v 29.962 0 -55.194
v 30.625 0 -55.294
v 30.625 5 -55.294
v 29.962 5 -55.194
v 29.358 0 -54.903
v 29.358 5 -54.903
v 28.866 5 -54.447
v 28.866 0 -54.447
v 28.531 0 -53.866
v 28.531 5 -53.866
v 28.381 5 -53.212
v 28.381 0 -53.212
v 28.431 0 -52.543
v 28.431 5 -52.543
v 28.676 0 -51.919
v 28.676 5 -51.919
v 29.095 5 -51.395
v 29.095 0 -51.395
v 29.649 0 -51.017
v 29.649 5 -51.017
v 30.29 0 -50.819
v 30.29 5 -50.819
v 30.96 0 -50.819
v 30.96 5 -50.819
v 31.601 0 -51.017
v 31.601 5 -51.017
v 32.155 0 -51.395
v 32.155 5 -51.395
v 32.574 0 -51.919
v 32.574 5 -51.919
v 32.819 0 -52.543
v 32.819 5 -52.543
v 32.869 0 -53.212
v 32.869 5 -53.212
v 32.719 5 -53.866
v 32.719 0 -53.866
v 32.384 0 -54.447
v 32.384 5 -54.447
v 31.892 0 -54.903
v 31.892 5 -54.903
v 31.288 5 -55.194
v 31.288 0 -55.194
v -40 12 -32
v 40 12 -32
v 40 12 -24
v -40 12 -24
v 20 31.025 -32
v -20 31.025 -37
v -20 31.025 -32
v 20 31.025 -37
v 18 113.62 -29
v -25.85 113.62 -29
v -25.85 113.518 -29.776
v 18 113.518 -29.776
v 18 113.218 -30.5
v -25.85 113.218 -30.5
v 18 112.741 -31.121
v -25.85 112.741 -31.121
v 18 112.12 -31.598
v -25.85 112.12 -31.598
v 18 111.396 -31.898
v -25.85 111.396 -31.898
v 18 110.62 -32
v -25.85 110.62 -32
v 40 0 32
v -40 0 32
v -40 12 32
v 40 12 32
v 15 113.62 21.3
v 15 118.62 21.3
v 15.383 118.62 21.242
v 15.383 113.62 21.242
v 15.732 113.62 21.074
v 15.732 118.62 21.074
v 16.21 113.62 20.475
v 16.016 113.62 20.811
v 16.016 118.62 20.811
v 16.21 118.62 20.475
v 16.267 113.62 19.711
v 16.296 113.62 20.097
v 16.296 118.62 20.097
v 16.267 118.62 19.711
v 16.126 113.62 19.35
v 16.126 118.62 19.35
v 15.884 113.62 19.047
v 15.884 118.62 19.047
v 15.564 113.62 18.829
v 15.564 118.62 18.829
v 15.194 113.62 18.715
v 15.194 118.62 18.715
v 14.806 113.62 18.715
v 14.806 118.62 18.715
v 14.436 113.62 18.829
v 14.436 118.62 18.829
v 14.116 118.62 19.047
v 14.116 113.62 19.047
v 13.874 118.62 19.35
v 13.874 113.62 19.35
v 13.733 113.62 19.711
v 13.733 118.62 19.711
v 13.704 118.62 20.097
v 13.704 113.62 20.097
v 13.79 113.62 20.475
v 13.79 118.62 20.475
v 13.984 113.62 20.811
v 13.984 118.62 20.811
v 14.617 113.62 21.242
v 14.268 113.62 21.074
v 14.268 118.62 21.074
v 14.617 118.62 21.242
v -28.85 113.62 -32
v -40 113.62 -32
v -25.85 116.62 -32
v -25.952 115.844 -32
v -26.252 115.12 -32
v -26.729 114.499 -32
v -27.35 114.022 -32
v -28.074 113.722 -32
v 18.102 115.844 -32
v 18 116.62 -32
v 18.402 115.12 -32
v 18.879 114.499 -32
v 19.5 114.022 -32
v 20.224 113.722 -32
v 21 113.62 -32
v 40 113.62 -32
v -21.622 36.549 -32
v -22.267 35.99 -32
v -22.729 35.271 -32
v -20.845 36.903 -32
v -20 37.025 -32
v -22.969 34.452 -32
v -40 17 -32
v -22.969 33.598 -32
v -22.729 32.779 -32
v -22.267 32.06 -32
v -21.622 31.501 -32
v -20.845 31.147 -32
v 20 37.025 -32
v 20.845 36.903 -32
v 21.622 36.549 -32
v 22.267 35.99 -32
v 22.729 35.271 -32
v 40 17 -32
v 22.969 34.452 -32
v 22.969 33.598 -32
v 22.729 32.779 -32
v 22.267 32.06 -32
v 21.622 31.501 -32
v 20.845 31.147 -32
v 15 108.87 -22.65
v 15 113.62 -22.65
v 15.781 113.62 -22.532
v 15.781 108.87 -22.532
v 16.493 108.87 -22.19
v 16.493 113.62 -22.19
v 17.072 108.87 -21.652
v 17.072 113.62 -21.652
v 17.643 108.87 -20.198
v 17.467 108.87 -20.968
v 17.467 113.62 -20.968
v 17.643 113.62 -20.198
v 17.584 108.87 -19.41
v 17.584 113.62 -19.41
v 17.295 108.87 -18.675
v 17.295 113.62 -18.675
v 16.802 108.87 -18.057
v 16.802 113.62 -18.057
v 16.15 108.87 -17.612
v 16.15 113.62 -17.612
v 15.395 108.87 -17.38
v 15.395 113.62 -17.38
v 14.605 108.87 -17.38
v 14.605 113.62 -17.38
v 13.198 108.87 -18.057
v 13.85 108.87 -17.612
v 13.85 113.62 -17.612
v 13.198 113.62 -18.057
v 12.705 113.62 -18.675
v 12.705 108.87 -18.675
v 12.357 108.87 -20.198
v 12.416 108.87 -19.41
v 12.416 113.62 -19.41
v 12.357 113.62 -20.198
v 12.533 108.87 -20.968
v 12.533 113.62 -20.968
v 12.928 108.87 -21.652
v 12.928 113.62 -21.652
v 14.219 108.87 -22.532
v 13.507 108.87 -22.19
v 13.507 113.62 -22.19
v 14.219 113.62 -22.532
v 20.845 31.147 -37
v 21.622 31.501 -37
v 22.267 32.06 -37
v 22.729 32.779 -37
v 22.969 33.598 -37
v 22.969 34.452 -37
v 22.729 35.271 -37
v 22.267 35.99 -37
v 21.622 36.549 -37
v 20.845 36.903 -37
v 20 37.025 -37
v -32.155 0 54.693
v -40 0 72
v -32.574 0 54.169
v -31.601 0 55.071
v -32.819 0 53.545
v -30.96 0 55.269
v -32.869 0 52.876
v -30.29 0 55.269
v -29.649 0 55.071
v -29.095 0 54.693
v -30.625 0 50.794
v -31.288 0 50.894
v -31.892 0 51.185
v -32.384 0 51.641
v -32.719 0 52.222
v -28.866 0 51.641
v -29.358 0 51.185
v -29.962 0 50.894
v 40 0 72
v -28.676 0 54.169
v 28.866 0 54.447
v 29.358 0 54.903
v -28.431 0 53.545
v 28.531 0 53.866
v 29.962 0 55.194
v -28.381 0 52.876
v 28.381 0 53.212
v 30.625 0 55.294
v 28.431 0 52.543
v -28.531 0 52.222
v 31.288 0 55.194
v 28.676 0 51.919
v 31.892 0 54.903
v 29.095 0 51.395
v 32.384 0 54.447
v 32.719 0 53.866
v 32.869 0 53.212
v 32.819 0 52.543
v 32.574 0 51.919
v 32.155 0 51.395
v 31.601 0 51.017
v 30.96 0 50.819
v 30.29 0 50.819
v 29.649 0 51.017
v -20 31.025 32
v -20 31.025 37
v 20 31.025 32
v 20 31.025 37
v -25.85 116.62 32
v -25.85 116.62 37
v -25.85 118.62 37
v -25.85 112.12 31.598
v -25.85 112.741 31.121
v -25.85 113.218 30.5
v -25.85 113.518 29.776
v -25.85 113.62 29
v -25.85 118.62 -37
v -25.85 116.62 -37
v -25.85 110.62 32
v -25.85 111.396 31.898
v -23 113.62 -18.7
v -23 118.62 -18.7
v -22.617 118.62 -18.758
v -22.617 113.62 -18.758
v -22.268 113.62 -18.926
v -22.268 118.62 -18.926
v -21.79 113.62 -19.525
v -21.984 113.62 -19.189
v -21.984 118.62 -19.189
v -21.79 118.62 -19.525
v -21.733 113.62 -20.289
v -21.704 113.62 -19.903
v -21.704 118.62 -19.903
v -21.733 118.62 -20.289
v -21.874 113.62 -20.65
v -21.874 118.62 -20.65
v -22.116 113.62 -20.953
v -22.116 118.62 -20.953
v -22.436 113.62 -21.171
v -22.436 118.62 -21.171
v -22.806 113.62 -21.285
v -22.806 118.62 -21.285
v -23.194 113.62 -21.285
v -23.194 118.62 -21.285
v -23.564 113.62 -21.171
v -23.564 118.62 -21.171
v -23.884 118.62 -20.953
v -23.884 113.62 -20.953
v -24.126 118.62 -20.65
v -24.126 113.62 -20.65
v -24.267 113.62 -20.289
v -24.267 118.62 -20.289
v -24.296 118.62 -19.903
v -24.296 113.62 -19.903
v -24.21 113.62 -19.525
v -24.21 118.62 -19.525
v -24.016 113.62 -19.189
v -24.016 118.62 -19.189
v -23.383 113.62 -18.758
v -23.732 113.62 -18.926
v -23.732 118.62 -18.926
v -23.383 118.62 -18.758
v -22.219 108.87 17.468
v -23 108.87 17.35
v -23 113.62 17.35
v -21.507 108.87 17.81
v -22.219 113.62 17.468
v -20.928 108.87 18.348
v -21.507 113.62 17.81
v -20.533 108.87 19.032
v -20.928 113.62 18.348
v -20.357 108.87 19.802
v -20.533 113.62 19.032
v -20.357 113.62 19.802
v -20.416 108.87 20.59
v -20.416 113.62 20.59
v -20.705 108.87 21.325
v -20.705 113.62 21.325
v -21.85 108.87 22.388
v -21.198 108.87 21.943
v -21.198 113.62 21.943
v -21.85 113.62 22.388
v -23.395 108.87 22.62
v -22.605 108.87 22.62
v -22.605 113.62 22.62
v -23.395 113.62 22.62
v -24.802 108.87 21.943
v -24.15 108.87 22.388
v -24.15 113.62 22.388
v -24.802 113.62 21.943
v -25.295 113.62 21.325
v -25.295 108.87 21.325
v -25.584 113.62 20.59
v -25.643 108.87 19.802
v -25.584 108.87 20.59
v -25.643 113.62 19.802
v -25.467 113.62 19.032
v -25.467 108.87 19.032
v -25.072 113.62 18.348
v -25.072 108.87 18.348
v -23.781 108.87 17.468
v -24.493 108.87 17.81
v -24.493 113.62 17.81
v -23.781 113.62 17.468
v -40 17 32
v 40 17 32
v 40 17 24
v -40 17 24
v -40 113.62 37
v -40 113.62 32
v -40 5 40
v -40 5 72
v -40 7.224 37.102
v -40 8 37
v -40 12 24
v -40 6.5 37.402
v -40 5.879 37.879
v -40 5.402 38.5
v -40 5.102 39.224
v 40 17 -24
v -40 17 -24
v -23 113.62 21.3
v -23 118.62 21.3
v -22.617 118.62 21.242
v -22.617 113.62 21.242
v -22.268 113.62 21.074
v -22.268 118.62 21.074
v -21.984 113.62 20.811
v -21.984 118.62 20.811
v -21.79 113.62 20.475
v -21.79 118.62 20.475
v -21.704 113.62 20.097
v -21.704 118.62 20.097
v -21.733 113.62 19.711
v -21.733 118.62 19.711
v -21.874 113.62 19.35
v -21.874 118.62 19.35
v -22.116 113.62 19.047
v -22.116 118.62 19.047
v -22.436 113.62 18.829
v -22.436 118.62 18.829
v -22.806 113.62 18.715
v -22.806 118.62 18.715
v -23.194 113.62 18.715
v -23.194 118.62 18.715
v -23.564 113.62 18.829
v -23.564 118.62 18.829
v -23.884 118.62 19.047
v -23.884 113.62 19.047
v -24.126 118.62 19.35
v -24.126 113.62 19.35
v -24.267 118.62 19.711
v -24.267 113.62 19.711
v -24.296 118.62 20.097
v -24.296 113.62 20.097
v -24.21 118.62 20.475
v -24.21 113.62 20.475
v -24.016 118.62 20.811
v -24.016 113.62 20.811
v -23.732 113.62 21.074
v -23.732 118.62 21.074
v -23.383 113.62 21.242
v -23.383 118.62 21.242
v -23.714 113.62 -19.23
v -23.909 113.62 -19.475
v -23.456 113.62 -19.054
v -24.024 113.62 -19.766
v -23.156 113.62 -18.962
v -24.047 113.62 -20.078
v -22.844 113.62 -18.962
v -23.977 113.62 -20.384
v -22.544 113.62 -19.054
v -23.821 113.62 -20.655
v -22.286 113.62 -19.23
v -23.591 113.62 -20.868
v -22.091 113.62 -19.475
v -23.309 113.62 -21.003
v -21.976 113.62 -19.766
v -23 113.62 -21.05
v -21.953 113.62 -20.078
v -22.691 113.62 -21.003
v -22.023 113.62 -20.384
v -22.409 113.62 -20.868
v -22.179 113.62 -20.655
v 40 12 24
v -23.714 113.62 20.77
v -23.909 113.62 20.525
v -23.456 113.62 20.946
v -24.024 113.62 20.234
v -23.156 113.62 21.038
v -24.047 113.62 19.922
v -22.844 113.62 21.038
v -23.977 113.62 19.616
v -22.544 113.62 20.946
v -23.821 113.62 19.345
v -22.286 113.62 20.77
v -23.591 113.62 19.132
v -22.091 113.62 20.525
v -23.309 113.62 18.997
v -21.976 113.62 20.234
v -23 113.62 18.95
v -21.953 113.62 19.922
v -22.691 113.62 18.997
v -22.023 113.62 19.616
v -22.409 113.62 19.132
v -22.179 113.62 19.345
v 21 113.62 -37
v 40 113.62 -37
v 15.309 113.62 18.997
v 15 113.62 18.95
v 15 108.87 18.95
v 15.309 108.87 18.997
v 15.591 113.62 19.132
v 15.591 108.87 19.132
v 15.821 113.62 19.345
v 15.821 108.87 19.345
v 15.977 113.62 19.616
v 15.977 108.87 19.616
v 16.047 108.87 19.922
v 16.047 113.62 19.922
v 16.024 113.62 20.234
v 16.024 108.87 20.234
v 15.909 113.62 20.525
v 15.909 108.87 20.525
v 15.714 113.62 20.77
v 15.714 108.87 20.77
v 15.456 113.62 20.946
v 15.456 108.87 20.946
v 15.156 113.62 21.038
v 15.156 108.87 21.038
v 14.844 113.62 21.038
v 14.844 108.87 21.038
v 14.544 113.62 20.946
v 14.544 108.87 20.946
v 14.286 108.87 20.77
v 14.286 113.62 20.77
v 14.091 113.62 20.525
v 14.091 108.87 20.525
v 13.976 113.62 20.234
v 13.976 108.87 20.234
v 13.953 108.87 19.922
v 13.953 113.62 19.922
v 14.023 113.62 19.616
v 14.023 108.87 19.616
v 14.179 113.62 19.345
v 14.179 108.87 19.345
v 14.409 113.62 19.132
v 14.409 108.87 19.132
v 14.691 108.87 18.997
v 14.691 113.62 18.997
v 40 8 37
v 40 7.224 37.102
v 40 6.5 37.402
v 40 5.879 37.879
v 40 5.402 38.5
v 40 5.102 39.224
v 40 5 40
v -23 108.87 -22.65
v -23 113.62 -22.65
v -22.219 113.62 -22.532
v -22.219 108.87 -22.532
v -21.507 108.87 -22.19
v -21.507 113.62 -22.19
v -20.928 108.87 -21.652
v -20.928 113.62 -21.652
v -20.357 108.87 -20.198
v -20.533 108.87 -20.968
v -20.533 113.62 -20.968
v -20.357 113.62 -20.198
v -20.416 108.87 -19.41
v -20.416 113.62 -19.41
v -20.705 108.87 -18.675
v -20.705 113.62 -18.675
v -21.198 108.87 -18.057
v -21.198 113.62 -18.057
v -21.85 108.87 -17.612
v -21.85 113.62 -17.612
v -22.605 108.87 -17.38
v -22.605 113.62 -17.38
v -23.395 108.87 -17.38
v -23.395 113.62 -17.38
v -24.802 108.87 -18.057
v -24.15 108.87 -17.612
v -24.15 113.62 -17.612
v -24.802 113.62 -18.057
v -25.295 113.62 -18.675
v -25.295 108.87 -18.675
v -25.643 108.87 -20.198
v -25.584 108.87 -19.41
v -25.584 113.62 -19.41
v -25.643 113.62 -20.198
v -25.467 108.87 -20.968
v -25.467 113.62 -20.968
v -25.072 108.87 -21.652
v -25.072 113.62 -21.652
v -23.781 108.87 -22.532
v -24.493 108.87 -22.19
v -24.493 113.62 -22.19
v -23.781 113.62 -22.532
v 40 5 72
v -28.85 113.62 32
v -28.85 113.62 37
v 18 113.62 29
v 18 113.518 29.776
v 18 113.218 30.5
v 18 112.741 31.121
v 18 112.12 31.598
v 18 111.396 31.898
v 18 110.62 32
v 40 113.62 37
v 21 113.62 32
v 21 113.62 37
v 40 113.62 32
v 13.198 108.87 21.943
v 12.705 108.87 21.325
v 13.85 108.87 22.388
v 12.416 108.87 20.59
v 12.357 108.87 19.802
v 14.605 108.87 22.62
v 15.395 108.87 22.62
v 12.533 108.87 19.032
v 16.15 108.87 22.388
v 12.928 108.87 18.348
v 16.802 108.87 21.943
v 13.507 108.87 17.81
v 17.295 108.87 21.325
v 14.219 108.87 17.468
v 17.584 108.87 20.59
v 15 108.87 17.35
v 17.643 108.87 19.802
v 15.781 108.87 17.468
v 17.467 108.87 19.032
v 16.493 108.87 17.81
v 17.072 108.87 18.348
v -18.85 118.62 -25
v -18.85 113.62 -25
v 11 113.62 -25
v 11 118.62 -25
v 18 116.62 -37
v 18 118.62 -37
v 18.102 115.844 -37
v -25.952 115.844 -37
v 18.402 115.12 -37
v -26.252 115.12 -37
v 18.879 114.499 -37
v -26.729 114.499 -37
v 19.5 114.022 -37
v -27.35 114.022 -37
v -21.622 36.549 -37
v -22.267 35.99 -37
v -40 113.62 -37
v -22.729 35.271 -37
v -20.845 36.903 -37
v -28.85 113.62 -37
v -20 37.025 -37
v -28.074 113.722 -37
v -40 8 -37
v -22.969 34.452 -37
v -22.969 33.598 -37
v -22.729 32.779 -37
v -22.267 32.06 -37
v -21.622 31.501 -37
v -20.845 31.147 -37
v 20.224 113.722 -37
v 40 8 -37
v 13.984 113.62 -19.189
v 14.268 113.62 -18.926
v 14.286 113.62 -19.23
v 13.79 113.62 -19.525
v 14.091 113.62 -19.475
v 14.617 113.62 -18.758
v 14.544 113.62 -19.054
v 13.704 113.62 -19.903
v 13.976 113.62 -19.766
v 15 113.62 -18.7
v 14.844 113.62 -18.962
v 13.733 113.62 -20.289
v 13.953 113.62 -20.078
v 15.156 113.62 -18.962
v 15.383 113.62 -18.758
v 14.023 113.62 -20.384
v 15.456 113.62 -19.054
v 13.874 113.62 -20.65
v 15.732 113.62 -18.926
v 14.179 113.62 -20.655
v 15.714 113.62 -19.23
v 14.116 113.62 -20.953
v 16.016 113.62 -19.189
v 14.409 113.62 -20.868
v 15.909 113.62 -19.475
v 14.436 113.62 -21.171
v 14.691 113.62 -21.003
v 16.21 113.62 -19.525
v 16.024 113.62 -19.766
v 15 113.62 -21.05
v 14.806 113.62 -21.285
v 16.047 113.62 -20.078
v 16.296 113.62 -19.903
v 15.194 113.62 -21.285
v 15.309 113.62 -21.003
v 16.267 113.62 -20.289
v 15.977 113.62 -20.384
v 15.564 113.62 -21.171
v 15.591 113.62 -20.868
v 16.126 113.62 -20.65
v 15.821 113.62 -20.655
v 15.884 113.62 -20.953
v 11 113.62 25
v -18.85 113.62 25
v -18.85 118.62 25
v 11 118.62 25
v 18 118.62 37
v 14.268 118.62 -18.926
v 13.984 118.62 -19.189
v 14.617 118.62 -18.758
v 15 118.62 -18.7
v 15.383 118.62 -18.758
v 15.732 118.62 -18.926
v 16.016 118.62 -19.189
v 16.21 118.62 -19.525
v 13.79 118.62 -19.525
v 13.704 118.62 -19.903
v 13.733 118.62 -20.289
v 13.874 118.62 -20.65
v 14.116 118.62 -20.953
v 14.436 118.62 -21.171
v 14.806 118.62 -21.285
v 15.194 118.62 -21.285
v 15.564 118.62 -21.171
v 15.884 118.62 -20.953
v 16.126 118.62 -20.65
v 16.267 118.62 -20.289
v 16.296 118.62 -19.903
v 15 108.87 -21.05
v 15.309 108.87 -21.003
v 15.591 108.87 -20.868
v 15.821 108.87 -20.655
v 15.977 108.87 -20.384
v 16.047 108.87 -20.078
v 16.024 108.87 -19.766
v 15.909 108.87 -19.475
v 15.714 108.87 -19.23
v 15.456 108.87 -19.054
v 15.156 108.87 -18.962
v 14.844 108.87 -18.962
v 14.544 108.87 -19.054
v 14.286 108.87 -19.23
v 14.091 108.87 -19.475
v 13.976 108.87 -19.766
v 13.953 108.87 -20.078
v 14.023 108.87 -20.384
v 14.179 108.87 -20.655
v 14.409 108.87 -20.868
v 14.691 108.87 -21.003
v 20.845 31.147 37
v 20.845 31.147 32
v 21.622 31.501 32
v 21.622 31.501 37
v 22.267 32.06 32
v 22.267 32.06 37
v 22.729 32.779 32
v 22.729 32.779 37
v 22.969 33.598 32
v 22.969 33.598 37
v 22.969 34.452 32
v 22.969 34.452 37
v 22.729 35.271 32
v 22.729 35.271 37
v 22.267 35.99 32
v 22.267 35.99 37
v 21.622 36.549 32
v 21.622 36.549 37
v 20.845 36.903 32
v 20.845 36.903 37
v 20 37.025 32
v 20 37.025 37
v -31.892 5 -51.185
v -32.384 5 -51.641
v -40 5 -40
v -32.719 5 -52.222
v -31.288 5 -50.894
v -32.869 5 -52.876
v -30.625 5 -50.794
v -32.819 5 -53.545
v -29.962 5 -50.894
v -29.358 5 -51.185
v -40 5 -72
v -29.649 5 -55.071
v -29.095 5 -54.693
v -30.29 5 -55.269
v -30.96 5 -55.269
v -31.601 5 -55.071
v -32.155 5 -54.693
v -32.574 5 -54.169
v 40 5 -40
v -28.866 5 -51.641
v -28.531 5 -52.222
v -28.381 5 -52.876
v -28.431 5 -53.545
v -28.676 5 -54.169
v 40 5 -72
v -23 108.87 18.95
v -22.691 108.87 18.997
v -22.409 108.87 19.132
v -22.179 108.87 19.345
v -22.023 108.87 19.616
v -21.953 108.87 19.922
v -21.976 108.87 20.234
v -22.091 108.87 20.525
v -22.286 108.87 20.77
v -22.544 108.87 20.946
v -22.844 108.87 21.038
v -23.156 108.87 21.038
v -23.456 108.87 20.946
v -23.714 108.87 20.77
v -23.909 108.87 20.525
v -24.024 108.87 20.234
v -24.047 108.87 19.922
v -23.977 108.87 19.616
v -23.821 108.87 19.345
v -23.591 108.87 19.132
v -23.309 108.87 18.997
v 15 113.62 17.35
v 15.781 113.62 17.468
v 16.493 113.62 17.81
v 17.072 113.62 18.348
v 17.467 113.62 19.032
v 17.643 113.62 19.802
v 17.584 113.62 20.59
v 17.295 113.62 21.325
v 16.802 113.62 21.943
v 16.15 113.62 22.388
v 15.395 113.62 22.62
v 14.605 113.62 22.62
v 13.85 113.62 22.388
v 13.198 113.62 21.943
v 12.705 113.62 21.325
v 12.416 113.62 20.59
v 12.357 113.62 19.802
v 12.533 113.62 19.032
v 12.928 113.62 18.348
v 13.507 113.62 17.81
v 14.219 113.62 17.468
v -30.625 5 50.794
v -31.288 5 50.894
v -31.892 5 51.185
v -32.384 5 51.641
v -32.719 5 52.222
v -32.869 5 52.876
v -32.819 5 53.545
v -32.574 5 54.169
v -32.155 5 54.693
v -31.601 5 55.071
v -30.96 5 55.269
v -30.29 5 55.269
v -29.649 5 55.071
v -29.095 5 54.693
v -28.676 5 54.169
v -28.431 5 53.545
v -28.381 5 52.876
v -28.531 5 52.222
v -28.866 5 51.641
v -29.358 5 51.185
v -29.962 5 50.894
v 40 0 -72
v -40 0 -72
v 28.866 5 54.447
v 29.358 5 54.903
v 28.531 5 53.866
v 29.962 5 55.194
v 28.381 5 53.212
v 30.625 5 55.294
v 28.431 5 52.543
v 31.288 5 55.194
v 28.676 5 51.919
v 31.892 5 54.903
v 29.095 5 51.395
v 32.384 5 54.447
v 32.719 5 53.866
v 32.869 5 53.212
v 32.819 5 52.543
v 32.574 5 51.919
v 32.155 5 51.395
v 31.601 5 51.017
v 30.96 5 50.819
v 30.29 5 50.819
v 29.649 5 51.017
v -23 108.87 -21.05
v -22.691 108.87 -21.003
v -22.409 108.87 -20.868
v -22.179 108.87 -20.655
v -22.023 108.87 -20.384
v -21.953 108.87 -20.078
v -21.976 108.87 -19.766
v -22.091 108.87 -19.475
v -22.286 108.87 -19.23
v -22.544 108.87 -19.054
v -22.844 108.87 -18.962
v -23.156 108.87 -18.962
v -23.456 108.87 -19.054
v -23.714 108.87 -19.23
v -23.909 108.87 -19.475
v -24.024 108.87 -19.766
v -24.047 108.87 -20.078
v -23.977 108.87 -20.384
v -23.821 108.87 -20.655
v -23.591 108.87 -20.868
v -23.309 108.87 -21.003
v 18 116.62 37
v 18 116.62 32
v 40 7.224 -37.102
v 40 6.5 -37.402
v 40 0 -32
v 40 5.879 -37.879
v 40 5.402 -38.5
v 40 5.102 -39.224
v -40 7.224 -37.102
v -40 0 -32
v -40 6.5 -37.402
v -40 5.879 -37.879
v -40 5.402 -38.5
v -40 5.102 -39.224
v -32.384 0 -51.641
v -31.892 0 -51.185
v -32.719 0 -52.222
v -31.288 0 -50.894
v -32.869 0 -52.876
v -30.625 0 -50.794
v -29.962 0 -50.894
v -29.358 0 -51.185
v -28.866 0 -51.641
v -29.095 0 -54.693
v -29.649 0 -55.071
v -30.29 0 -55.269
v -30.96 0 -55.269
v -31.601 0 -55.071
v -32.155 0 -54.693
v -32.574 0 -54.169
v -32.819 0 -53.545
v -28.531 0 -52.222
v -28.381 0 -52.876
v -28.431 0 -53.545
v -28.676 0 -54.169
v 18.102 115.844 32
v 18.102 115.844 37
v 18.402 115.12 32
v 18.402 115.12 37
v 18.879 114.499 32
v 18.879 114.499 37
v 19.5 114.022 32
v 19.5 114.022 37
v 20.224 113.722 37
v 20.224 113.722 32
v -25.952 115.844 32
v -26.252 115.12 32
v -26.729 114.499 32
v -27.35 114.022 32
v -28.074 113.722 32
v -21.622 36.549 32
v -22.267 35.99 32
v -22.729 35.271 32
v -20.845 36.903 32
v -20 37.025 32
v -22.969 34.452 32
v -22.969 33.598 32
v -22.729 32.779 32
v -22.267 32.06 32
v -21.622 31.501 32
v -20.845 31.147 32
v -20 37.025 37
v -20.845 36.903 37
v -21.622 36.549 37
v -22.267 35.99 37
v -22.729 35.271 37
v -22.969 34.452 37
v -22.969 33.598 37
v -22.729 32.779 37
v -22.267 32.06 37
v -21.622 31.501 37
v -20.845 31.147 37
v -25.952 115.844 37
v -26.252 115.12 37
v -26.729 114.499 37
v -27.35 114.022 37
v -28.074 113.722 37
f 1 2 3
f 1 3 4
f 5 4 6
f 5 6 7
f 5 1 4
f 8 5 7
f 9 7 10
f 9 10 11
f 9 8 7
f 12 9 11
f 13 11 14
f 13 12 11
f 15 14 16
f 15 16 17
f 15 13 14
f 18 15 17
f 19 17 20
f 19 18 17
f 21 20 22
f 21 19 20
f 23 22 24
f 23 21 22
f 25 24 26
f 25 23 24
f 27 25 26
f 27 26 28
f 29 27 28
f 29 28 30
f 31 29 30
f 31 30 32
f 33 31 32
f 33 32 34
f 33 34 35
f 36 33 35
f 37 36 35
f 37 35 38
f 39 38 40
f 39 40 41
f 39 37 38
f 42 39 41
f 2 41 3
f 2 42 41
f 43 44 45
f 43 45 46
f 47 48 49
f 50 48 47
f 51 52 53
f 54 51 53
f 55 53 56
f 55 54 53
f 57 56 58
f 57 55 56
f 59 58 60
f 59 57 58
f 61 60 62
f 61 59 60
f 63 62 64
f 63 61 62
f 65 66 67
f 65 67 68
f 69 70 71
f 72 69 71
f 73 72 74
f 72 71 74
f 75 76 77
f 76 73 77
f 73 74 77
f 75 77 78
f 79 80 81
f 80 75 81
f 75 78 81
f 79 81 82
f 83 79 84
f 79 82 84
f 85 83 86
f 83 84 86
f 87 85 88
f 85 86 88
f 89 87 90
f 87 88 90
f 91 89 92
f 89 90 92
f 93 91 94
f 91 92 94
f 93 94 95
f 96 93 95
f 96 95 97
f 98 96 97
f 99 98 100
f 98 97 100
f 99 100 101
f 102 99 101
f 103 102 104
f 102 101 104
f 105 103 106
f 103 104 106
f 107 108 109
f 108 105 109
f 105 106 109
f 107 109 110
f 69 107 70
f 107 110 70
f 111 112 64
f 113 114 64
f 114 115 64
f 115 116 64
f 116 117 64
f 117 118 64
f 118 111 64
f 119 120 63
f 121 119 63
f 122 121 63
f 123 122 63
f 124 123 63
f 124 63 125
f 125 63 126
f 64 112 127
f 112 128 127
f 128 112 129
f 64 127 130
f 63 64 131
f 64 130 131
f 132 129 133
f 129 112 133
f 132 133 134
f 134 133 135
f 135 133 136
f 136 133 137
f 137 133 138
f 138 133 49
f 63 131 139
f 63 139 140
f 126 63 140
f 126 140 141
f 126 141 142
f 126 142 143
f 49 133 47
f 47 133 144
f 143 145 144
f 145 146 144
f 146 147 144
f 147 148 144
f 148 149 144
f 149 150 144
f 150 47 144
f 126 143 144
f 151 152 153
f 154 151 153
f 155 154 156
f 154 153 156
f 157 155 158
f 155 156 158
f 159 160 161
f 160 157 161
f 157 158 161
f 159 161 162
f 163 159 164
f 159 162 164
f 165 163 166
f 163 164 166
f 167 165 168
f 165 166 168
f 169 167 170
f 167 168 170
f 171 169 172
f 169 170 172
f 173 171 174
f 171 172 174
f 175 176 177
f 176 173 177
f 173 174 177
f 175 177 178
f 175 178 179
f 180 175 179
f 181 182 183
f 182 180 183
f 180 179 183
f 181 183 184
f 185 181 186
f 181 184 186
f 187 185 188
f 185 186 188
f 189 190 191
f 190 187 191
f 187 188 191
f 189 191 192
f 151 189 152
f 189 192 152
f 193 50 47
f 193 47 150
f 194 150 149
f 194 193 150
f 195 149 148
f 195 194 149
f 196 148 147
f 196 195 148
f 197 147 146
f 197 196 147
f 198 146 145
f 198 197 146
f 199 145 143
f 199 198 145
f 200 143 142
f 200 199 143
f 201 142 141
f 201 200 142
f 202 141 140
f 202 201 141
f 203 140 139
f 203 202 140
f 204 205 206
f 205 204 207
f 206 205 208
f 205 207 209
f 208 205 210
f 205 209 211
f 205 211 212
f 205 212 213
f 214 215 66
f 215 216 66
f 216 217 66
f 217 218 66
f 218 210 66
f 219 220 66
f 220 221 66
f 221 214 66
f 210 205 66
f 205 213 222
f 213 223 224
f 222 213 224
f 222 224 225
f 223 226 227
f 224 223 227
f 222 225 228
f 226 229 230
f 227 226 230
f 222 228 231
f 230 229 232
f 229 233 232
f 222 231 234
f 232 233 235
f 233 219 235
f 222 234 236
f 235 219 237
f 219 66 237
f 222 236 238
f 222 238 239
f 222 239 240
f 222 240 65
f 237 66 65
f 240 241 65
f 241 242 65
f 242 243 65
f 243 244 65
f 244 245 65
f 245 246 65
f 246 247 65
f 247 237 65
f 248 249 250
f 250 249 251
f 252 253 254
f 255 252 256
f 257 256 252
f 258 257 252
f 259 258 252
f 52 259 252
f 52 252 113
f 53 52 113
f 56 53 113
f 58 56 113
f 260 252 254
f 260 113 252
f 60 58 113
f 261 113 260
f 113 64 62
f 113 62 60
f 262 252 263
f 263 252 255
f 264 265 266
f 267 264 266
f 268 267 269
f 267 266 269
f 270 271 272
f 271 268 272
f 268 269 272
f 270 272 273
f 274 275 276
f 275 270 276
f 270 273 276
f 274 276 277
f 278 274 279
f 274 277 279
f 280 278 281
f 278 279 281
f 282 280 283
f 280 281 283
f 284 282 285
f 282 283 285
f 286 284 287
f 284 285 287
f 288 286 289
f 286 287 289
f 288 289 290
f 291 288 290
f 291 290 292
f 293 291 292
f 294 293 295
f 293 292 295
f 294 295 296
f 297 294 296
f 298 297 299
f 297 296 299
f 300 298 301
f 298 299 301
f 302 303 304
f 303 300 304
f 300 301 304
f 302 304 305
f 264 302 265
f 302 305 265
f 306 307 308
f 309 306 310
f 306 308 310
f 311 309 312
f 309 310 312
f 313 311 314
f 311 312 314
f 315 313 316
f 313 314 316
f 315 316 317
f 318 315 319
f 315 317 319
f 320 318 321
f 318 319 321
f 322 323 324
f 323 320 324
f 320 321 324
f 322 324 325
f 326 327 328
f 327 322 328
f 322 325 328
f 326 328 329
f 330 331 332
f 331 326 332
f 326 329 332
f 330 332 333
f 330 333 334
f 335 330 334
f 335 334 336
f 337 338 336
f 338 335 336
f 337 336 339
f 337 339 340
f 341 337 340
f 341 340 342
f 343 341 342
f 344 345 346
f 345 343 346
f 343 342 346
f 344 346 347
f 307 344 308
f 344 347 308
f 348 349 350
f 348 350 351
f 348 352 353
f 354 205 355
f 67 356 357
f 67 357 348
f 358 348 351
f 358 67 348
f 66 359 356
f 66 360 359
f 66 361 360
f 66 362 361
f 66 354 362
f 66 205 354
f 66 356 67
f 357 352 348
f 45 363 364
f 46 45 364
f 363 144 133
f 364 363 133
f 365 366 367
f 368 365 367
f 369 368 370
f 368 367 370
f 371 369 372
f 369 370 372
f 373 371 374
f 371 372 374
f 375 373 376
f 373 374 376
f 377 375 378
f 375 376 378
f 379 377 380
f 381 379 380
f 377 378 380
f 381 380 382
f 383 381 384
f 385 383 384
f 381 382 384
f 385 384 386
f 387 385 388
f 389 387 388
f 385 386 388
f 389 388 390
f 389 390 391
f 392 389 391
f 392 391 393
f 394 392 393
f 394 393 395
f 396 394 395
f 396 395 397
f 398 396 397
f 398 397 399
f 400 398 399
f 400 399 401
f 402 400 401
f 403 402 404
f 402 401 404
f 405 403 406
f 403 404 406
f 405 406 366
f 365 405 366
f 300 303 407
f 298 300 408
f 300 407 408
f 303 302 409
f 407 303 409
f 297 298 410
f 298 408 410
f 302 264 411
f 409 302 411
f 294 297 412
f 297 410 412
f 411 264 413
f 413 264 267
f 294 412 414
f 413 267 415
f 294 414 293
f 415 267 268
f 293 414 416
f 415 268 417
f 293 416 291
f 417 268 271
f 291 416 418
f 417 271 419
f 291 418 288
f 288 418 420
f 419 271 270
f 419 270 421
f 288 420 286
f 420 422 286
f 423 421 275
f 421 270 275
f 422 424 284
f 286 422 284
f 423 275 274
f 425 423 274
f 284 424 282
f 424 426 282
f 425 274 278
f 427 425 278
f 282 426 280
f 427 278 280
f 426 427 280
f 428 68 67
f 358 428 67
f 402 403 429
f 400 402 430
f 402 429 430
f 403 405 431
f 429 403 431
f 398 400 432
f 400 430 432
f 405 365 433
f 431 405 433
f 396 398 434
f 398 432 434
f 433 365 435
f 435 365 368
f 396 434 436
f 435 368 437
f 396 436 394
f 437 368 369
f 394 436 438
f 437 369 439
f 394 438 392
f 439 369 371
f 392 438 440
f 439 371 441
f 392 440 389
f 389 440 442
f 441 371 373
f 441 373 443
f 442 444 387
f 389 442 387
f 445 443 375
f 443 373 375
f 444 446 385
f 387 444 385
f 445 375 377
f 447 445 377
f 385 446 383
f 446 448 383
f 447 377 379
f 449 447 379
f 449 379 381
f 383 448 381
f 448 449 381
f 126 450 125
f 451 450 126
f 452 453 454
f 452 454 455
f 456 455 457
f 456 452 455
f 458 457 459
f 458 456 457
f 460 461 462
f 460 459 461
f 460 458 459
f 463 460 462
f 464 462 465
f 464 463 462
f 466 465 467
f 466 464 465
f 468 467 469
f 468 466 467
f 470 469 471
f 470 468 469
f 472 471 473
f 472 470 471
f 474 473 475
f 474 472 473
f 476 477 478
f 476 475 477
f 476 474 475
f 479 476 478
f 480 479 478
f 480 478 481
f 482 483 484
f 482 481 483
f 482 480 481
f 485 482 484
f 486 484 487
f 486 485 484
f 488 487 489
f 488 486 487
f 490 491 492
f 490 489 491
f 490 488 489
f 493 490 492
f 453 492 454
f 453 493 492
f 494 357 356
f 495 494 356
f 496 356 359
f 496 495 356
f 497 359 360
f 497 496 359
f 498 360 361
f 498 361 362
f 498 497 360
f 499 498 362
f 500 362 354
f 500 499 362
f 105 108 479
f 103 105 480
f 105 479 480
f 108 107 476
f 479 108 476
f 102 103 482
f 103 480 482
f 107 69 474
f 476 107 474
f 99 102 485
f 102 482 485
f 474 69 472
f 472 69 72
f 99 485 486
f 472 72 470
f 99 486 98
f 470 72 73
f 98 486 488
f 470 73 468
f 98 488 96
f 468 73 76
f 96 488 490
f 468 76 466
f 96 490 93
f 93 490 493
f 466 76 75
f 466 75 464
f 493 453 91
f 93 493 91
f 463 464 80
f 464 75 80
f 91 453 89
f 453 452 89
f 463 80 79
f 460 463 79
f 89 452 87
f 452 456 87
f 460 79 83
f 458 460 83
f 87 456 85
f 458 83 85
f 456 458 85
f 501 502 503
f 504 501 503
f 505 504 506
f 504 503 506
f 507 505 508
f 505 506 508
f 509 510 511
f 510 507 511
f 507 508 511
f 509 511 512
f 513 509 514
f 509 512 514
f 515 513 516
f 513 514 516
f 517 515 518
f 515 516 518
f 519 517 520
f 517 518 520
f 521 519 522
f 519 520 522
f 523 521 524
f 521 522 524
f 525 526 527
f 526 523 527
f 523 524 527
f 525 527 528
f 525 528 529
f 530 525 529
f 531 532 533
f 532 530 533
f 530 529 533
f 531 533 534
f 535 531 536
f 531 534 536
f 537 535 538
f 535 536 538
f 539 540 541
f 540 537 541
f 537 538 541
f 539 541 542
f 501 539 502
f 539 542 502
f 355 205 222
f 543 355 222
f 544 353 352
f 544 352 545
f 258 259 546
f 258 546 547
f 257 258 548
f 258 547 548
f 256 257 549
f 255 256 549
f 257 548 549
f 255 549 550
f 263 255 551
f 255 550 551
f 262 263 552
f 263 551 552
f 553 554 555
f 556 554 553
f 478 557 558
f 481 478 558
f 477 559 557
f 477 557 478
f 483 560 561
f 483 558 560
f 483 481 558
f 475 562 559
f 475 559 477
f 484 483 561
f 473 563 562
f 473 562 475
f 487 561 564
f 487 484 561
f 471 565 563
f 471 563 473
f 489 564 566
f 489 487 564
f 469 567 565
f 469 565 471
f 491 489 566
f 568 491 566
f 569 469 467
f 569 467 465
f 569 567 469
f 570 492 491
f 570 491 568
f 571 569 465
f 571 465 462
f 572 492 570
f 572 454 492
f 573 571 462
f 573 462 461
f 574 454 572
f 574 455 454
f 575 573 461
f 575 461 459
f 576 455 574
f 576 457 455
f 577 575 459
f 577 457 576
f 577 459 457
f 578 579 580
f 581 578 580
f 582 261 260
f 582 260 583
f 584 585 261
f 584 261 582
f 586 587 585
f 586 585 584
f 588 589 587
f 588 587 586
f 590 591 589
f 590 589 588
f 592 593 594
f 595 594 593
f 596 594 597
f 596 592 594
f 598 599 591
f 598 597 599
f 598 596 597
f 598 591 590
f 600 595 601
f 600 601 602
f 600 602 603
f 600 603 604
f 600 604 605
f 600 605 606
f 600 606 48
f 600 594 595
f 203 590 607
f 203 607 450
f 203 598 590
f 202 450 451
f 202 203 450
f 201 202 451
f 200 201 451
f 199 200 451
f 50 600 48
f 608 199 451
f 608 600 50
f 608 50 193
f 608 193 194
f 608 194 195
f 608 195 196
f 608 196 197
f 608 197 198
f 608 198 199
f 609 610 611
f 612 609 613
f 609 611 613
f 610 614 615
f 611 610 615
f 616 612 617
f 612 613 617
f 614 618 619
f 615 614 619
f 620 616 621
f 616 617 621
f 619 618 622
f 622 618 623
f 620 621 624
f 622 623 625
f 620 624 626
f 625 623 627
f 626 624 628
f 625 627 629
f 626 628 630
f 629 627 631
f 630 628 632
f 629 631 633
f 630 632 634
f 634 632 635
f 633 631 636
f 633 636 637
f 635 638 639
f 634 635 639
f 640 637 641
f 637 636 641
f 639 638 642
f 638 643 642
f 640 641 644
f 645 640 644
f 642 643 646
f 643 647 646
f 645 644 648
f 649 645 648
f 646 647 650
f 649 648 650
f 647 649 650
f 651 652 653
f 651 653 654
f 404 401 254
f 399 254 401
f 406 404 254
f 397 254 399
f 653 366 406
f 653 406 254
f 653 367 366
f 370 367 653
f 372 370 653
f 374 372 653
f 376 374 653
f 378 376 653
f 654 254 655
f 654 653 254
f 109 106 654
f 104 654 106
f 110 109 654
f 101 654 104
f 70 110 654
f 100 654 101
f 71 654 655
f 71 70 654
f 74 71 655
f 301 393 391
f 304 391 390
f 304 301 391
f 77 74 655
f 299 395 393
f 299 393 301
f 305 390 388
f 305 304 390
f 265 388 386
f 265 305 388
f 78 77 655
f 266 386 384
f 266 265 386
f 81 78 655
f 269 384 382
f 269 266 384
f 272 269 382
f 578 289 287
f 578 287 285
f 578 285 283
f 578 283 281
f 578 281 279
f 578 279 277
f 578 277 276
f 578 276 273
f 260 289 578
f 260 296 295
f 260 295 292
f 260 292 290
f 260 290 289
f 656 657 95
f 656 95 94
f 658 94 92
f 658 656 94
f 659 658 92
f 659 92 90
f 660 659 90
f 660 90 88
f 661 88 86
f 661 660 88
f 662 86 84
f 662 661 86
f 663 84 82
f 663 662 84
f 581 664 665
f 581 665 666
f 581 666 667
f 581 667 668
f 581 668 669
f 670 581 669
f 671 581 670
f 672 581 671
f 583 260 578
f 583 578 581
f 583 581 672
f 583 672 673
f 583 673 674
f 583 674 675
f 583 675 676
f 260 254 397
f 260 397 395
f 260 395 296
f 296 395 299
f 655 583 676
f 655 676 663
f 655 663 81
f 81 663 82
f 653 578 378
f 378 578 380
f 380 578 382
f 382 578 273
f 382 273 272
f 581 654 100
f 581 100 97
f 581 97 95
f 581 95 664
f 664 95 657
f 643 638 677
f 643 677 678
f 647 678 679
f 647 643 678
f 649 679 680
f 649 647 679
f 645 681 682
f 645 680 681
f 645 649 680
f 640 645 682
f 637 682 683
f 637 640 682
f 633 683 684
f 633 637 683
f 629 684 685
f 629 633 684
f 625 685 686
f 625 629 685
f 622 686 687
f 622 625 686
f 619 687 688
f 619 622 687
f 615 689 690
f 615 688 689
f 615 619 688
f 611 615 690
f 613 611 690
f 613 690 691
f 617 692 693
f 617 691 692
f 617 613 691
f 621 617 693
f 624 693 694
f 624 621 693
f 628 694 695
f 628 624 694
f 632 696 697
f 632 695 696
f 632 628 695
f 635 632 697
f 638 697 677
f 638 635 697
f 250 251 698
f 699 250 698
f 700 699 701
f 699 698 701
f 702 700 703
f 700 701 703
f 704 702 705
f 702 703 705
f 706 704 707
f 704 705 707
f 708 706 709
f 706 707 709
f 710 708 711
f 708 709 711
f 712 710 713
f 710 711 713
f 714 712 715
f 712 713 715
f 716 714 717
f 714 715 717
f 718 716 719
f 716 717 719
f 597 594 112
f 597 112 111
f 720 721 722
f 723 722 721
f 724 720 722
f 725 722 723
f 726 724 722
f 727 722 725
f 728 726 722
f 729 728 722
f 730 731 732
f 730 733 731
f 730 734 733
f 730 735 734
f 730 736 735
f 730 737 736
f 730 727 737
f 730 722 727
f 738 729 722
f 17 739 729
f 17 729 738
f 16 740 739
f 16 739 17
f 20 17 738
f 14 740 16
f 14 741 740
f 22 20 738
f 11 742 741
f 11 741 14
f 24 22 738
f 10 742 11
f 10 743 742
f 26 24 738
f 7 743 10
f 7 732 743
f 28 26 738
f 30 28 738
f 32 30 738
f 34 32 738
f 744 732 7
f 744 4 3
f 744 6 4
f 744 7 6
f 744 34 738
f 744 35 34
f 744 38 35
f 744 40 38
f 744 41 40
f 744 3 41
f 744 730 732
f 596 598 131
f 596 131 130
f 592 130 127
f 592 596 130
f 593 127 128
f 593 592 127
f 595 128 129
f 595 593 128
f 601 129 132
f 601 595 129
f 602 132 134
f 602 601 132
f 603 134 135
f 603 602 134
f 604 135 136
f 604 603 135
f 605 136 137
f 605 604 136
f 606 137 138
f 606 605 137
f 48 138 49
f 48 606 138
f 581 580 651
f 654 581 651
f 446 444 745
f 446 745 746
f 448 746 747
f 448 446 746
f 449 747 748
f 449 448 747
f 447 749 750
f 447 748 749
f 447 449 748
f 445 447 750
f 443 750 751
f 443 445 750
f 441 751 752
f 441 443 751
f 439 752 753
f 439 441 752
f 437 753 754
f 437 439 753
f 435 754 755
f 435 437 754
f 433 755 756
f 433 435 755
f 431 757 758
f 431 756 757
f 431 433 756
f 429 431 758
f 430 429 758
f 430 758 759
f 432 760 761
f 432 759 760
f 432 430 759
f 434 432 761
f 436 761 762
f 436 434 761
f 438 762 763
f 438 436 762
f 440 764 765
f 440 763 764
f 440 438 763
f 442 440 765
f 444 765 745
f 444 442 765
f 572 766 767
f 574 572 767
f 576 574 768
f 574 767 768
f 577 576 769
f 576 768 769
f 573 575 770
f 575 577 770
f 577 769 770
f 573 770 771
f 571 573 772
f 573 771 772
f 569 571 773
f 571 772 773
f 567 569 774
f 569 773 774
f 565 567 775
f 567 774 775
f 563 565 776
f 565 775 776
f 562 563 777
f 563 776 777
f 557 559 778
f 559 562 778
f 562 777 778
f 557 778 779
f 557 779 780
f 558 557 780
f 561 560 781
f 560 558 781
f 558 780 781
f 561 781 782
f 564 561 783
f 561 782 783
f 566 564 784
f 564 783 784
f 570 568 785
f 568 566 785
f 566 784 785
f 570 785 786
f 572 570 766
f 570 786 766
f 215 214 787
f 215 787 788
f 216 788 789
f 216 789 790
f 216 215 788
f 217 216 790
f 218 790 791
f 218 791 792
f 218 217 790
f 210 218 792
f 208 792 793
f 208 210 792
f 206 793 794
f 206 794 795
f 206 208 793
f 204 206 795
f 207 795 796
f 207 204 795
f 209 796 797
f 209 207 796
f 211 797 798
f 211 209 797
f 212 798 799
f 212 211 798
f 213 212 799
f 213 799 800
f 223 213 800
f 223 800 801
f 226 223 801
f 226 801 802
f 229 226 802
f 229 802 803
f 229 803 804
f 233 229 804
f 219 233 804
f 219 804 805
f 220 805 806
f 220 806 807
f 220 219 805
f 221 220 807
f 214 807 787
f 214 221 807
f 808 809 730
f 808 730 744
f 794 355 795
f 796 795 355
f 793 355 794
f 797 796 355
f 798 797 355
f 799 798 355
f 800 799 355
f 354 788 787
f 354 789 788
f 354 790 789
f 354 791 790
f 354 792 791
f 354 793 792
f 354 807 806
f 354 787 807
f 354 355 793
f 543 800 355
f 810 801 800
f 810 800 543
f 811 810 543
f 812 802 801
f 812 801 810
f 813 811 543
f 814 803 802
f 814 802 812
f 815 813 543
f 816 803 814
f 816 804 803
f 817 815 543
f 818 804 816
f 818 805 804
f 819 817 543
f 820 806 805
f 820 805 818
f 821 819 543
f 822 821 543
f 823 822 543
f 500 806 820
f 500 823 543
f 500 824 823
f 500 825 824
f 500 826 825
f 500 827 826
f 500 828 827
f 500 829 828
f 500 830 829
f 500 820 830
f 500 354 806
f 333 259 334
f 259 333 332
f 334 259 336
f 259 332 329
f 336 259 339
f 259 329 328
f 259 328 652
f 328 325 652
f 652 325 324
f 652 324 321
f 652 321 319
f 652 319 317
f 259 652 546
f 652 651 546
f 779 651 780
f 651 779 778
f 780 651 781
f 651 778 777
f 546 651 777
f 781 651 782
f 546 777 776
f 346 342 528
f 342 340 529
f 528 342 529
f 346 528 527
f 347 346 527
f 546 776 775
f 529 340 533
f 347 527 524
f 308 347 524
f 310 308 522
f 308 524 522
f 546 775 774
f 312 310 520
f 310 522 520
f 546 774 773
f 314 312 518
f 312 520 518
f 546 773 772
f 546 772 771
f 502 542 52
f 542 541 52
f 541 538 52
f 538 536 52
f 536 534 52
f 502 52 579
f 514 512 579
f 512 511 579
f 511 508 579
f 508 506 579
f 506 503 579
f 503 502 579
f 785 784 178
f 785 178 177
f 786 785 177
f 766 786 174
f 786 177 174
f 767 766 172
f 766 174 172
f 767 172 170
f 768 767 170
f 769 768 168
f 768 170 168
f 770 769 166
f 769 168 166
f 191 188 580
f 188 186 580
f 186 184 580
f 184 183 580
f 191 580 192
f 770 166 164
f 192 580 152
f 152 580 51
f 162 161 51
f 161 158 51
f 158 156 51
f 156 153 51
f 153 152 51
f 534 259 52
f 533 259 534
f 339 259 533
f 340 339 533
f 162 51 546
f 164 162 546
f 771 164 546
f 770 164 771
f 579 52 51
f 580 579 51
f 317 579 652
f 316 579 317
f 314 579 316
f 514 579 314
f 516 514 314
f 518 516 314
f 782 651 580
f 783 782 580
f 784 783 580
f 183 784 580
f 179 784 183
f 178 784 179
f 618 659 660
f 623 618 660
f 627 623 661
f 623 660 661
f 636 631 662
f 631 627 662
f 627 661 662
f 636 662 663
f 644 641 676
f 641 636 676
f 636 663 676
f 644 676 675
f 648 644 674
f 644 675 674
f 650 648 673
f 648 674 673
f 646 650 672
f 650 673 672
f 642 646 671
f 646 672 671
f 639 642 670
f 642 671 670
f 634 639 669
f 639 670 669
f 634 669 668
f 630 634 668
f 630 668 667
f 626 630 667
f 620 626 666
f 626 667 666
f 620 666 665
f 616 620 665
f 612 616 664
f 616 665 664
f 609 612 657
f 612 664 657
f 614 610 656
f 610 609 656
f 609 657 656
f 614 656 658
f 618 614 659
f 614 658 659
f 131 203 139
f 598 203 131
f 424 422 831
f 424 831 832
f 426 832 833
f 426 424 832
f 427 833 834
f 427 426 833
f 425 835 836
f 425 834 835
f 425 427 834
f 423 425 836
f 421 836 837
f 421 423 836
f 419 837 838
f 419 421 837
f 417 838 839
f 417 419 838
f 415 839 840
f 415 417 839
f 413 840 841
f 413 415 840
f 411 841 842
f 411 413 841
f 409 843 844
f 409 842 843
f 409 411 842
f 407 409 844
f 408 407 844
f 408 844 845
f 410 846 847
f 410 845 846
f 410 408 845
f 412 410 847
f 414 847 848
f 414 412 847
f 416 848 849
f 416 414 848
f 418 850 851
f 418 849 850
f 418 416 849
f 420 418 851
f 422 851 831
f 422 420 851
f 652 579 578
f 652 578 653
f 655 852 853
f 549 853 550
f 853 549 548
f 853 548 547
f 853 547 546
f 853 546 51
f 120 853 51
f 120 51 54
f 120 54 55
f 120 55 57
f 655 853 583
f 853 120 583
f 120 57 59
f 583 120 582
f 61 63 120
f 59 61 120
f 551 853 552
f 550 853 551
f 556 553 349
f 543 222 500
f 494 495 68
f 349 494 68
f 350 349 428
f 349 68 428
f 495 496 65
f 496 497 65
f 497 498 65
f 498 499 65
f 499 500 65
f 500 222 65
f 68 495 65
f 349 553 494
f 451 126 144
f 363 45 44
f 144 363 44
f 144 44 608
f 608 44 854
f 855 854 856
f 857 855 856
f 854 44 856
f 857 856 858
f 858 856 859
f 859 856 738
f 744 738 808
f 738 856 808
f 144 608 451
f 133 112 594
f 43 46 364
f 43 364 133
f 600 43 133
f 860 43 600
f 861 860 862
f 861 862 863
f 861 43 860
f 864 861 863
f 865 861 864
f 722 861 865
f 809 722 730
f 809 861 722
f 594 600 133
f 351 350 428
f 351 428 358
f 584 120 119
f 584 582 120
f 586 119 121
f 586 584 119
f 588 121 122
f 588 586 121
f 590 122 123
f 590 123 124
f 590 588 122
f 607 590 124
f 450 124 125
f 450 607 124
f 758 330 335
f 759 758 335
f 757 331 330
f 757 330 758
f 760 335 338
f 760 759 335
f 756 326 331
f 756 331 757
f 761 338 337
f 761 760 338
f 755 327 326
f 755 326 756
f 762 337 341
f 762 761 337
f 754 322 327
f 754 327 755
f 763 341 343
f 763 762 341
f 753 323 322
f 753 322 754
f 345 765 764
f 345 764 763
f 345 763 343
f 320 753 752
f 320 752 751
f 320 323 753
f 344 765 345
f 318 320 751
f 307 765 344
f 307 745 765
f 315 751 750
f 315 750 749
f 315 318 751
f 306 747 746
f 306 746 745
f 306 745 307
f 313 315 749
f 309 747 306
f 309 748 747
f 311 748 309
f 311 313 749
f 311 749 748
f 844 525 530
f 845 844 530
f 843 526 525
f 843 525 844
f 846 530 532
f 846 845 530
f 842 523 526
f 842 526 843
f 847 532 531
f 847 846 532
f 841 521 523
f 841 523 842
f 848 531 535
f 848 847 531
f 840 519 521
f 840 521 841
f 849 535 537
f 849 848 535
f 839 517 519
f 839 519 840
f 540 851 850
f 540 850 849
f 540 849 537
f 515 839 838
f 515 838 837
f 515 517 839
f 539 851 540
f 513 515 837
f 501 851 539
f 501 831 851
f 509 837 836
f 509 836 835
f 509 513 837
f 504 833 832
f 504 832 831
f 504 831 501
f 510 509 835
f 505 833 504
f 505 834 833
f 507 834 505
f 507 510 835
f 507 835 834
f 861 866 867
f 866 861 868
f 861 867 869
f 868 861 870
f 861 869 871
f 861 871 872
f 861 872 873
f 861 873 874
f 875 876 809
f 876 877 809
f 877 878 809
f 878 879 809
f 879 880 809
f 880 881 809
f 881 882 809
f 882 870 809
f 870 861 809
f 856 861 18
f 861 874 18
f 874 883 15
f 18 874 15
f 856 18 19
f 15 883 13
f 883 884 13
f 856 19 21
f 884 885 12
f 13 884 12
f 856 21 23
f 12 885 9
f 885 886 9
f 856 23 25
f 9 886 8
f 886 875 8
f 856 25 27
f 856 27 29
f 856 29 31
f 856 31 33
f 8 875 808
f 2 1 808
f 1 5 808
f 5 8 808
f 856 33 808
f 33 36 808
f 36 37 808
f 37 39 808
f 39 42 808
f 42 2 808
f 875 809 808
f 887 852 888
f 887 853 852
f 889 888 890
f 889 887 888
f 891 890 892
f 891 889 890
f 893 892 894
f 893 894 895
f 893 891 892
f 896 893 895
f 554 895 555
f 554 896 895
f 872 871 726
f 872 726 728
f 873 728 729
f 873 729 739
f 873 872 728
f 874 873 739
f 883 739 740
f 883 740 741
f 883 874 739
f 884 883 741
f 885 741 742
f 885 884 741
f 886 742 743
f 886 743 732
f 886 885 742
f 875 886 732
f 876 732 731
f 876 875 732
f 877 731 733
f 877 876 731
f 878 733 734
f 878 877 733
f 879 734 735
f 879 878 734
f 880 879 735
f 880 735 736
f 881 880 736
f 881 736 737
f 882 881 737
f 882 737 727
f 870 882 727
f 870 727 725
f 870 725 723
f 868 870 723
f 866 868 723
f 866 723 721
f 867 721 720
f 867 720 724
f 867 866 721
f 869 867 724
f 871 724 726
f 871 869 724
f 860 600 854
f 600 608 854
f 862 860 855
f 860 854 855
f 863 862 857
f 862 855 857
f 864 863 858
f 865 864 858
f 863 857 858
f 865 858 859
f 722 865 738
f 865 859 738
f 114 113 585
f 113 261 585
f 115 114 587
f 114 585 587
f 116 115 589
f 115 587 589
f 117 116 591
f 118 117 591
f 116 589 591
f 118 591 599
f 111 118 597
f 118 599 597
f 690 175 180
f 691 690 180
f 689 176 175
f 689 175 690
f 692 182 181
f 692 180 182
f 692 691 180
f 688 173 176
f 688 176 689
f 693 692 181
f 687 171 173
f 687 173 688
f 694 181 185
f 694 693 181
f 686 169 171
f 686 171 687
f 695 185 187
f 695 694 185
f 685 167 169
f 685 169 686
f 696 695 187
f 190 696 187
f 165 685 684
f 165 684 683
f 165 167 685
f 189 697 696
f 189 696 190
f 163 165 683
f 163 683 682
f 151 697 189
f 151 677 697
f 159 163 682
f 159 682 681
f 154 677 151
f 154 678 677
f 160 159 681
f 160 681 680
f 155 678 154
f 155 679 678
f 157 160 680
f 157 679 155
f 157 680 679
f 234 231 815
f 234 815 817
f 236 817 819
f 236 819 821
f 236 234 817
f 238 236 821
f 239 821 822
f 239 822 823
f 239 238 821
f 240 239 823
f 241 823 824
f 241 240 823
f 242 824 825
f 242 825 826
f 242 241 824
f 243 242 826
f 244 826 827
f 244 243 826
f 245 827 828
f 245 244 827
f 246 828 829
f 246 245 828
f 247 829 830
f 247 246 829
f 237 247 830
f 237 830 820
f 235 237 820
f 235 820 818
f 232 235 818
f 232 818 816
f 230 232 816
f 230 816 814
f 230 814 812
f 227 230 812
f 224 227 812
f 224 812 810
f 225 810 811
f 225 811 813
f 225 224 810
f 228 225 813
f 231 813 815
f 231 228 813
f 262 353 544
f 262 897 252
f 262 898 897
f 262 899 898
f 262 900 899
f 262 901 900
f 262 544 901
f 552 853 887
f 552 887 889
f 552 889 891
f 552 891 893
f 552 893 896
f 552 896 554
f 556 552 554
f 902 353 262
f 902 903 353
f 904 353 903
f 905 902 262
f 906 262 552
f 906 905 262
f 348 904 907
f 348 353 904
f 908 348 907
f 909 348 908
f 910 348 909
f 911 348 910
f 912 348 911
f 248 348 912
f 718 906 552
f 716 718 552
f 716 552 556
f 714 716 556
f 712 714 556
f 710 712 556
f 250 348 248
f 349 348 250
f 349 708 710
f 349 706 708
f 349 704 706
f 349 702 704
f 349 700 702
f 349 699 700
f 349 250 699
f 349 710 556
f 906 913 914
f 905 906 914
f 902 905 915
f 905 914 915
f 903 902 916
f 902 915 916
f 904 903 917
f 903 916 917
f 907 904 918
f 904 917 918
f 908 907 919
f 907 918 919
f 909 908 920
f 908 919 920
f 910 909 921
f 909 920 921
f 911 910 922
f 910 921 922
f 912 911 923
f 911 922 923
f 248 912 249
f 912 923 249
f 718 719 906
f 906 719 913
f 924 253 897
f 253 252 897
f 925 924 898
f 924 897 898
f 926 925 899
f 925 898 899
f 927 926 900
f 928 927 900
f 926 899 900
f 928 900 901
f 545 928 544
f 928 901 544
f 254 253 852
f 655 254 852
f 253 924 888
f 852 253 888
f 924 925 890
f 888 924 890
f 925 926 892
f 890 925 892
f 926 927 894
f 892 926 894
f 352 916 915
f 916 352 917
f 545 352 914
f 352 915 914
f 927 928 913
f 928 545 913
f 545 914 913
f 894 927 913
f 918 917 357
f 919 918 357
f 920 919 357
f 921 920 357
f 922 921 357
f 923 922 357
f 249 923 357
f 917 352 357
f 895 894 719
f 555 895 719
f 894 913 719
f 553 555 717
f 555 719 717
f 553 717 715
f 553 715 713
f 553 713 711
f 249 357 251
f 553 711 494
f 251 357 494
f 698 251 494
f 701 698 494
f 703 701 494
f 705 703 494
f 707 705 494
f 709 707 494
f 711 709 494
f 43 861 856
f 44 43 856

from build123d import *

# Parameters (mm, degrees)
SKETCH1_W             = 80
SKETCH1_H             = 40
SKETCH1_R             = 2.25
BOSS_EXTRUDE1_DEPTH   = 5
BOSS_EXTRUDE1_2_DEPTH = 5
SKETCH2_W             = 80
SKETCH2_H             = 5
BOSS_EXTRUDE2_DEPTH   = 108.62
SKETCH3_W             = 43.85
SKETCH3_H             = 74
BOSS_EXTRUDE3_DEPTH   = 5
SKETCH5_W             = 29.85
SKETCH5_H             = 50
CUT_EXTRUDE2_DEPTH    = 10
CUT_EXTRUDE1_REACH    = 146.412
SKETCH4_R             = 1.3
FILLET1_R             = 3
FILLET2_R             = 3
SKETCH9_R             = 2.65
SKETCH9_R_2           = 1.05
BOSS_EXTRUDE5_DEPTH   = 4.75
SKETCH10_W            = 12
SKETCH10_H            = 6.8
CUT_EXTRUDE4_DEPTH    = 8
SKETCH11_W            = 80
SKETCH11_H            = 5
BOSS_EXTRUDE6_DEPTH   = 8
CUT_EXTRUDE5_REACH    = 167.987


with BuildPart() as part:
    # Sketch1 → Boss-Extrude1 (new body)
    with BuildSketch(Plane(origin=(0, 0, 0), x_dir=(1, 0, 0), z_dir=(0, 1, 0))):
        with Locations((0, 52)):
            Rectangle(SKETCH1_W, SKETCH1_H)
        with Locations(Location((-30.625, 53.044055982, 0), (0, 0, 270))):
            Circle(SKETCH1_R, mode=Mode.SUBTRACT)
        with Locations(Location((30.625, 53.044055982, 0), (0, 0, 90))):
            Circle(SKETCH1_R, mode=Mode.SUBTRACT)
    extrude(amount=BOSS_EXTRUDE1_DEPTH)



with BuildPart() as body_2:
    # Sketch1 → Boss-Extrude1 2 (new body)
    with BuildSketch(Plane(origin=(0, 0, 0), x_dir=(1, 0, 0), z_dir=(0, 1, 0))):
        with Locations((0, -52)):
            Rectangle(SKETCH1_W, SKETCH1_H)
        with Locations(Location((30.625, -53.044055982, 0), (0, 0, 270))):
            Circle(SKETCH1_R, mode=Mode.SUBTRACT)
        with Locations(Location((-30.625, -53.044055982, 0), (0, 0, 90))):
            Circle(SKETCH1_R, mode=Mode.SUBTRACT)
    extrude(amount=BOSS_EXTRUDE1_2_DEPTH)


with BuildPart() as part_1:
    add(part.part)

    add(body_2.part)  # Boss-Extrude2 merges body 2
    # Sketch2 → Boss-Extrude2 (add)
    with BuildSketch(Plane(origin=(0, 5, 0), x_dir=(1, 0, 0), z_dir=(0, 1, 0))):
        with Locations((0, 34.5)):
            Rectangle(SKETCH2_W, SKETCH2_H)
        with Locations((0, -34.5)):
            Rectangle(SKETCH2_W, SKETCH2_H)
    extrude(amount=BOSS_EXTRUDE2_DEPTH)

    # Sketch3 → Boss-Extrude3 (add)
    with BuildSketch(Plane(origin=(0, 113.62, 0), x_dir=(1, 0, 0), z_dir=(0, 1, 0))):
        with Locations((-3.925, 0)):
            Rectangle(SKETCH3_W, SKETCH3_H)
    extrude(amount=BOSS_EXTRUDE3_DEPTH)

    # Sketch5 → Cut-Extrude2 (cut)
    with BuildSketch(Plane.XZ.offset(-113.62)):
        with Locations((-3.925, 0)):
            Rectangle(SKETCH5_W, SKETCH5_H)
    extrude(amount=-CUT_EXTRUDE2_DEPTH, mode=Mode.SUBTRACT)

    # Sketch4 → Cut-Extrude1 (cut, up to next)
    with BuildSketch(Plane(origin=(0, 118.62, 0), x_dir=(1, 0, 0), z_dir=(0, 1, 0)), mode=Mode.PRIVATE) as cut_extrude1_sk1:
        with Locations(Location((-23, 20, 0), (0, 0, 270))):
            Circle(SKETCH4_R)
    cut_extrude1_tool1 = extrude(cut_extrude1_sk1.sketch, amount=-CUT_EXTRUDE1_REACH, mode=Mode.PRIVATE) & part_1.part
    # Sketch4 → Cut-Extrude1 (cut, up to next)
    with BuildSketch(Plane(origin=(0, 118.62, 0), x_dir=(1, 0, 0), z_dir=(0, 1, 0)), mode=Mode.PRIVATE) as cut_extrude1_sk2:
        with Locations(Location((15, 20, 0), (0, 0, 270))):
            Circle(SKETCH4_R)
    cut_extrude1_tool2 = extrude(cut_extrude1_sk2.sketch, amount=-CUT_EXTRUDE1_REACH, mode=Mode.PRIVATE) & part_1.part
    # Sketch4 → Cut-Extrude1 (cut, up to next)
    with BuildSketch(Plane(origin=(0, 118.62, 0), x_dir=(1, 0, 0), z_dir=(0, 1, 0)), mode=Mode.PRIVATE) as cut_extrude1_sk3:
        with Locations(Location((15, -20, 0), (0, 0, 270))):
            Circle(SKETCH4_R)
    cut_extrude1_tool3 = extrude(cut_extrude1_sk3.sketch, amount=-CUT_EXTRUDE1_REACH, mode=Mode.PRIVATE) & part_1.part
    # Sketch4 → Cut-Extrude1 (cut, up to next)
    with BuildSketch(Plane(origin=(0, 118.62, 0), x_dir=(1, 0, 0), z_dir=(0, 1, 0)), mode=Mode.PRIVATE) as cut_extrude1_sk4:
        with Locations(Location((-23, -20, 0), (0, 0, 270))):
            Circle(SKETCH4_R)
    cut_extrude1_tool4 = extrude(cut_extrude1_sk4.sketch, amount=-CUT_EXTRUDE1_REACH, mode=Mode.PRIVATE) & part_1.part
    add(cut_extrude1_tool1.solids().sort_by_distance((-23, 118.62, -20))[0], mode=Mode.SUBTRACT)
    add(cut_extrude1_tool2.solids().sort_by_distance((15, 118.62, -20))[0], mode=Mode.SUBTRACT)
    add(cut_extrude1_tool3.solids().sort_by_distance((15, 118.62, 20))[0], mode=Mode.SUBTRACT)
    add(cut_extrude1_tool4.solids().sort_by_distance((-23, 118.62, 20))[0], mode=Mode.SUBTRACT)

    # Fillet1
    fillet1_edges = [part_1.edges().sort_by_distance(p)[0] for p in [
        (0, 5, -37),
        (-3.925, 113.62, -32),
        (-3.925, 113.62, 32),
        (0, 5, 37),
    ]]
    fillet(fillet1_edges, radius=FILLET1_R)

    # Fillet2
    fillet2_edges = [part_1.edges().sort_by_distance(p)[0] for p in [
        (18, 113.62, -34.5),
        (-25.85, 113.62, -34.5),
        (-25.85, 113.62, 34.5),
        (18, 113.62, 34.5),
    ]]
    fillet(fillet2_edges, radius=FILLET2_R)

    # Sketch9 → Boss-Extrude5 (add)
    # profile 1 of 4: a face of its own
    with BuildSketch(Plane.XZ.offset(-113.62)):
        with Locations(Location((-23, 20, 0), (0, 0, 270))):
            Circle(SKETCH9_R)
        with Locations(Location((-23, 20, 0), (0, 0, 270))):
            Circle(SKETCH9_R_2, mode=Mode.SUBTRACT)
    # profile 2 of 4: a face of its own
    with BuildSketch(Plane.XZ.offset(-113.62)):
        with Locations(Location((-23, -20, 0), (0, 0, 270))):
            Circle(SKETCH9_R)
        with Locations(Location((-23, -20, 0), (0, 0, 270))):
            Circle(SKETCH9_R_2, mode=Mode.SUBTRACT)
    # profile 3 of 4: a face of its own
    with BuildSketch(Plane.XZ.offset(-113.62)):
        with Locations(Location((15, 20, 0), (0, 0, 270))):
            Circle(SKETCH9_R)
        with Locations(Location((15, 20, 0), (0, 0, 270))):
            Circle(SKETCH9_R_2, mode=Mode.SUBTRACT)
    # profile 4 of 4: a face of its own
    with BuildSketch(Plane.XZ.offset(-113.62)):
        with Locations(Location((15, -20, 0), (0, 0, 270))):
            Circle(SKETCH9_R)
        with Locations(Location((15, -20, 0), (0, 0, 270))):
            Circle(SKETCH9_R_2, mode=Mode.SUBTRACT)
    extrude(amount=BOSS_EXTRUDE5_DEPTH)

    # Sketch10 → Cut-Extrude4 (cut)
    with BuildSketch(Plane.XY.offset(37)):
        with Locations((6.7, 110.77)):
            Rectangle(SKETCH10_W, SKETCH10_H)
    extrude(amount=-CUT_EXTRUDE4_DEPTH, mode=Mode.SUBTRACT)

    # Sketch11 → Boss-Extrude6 (add)
    with BuildSketch(Plane(origin=(0, 0, 32), x_dir=(-1, 0, 0), z_dir=(0, 0, -1))):
        with Locations((0, 14.5)):
            Rectangle(SKETCH11_W, SKETCH11_H)
    extrude(amount=BOSS_EXTRUDE6_DEPTH)

    # Mirror3: part across plane


with BuildPart() as part_2:
    add(part_1.part)
    add(part_1.part.mirror(Plane.XY))

    # Sketch12 → Cut-Extrude5 (cut, up to next)
    with BuildSketch(Plane(origin=(0, 0, -37), x_dir=(-1, 0, 0), z_dir=(0, 0, -1)), mode=Mode.PRIVATE) as cut_extrude5_sk1:
        with BuildLine():
            Line((20, 31.025), (-20, 31.025))
            ThreePointArc((-20, 31.025), (-23, 34.025), (-20, 37.025))
            Line((-20, 37.025), (20, 37.025))
            ThreePointArc((20, 37.025), (23, 34.025), (20, 31.025))
        make_face()
    cut_extrude5_tool1 = extrude(cut_extrude5_sk1.sketch, amount=-CUT_EXTRUDE5_REACH, mode=Mode.PRIVATE) & part_2.part
    cut_extrude5 = cut_extrude5_tool1.solids().sort_by_distance((0, 34.025, -37))[0]
    add(cut_extrude5, mode=Mode.SUBTRACT)

    # Mirror4: Cut-Extrude5 across plane
    add(cut_extrude5.mirror(Plane.XY), mode=Mode.SUBTRACT)


solid = part_2.part
